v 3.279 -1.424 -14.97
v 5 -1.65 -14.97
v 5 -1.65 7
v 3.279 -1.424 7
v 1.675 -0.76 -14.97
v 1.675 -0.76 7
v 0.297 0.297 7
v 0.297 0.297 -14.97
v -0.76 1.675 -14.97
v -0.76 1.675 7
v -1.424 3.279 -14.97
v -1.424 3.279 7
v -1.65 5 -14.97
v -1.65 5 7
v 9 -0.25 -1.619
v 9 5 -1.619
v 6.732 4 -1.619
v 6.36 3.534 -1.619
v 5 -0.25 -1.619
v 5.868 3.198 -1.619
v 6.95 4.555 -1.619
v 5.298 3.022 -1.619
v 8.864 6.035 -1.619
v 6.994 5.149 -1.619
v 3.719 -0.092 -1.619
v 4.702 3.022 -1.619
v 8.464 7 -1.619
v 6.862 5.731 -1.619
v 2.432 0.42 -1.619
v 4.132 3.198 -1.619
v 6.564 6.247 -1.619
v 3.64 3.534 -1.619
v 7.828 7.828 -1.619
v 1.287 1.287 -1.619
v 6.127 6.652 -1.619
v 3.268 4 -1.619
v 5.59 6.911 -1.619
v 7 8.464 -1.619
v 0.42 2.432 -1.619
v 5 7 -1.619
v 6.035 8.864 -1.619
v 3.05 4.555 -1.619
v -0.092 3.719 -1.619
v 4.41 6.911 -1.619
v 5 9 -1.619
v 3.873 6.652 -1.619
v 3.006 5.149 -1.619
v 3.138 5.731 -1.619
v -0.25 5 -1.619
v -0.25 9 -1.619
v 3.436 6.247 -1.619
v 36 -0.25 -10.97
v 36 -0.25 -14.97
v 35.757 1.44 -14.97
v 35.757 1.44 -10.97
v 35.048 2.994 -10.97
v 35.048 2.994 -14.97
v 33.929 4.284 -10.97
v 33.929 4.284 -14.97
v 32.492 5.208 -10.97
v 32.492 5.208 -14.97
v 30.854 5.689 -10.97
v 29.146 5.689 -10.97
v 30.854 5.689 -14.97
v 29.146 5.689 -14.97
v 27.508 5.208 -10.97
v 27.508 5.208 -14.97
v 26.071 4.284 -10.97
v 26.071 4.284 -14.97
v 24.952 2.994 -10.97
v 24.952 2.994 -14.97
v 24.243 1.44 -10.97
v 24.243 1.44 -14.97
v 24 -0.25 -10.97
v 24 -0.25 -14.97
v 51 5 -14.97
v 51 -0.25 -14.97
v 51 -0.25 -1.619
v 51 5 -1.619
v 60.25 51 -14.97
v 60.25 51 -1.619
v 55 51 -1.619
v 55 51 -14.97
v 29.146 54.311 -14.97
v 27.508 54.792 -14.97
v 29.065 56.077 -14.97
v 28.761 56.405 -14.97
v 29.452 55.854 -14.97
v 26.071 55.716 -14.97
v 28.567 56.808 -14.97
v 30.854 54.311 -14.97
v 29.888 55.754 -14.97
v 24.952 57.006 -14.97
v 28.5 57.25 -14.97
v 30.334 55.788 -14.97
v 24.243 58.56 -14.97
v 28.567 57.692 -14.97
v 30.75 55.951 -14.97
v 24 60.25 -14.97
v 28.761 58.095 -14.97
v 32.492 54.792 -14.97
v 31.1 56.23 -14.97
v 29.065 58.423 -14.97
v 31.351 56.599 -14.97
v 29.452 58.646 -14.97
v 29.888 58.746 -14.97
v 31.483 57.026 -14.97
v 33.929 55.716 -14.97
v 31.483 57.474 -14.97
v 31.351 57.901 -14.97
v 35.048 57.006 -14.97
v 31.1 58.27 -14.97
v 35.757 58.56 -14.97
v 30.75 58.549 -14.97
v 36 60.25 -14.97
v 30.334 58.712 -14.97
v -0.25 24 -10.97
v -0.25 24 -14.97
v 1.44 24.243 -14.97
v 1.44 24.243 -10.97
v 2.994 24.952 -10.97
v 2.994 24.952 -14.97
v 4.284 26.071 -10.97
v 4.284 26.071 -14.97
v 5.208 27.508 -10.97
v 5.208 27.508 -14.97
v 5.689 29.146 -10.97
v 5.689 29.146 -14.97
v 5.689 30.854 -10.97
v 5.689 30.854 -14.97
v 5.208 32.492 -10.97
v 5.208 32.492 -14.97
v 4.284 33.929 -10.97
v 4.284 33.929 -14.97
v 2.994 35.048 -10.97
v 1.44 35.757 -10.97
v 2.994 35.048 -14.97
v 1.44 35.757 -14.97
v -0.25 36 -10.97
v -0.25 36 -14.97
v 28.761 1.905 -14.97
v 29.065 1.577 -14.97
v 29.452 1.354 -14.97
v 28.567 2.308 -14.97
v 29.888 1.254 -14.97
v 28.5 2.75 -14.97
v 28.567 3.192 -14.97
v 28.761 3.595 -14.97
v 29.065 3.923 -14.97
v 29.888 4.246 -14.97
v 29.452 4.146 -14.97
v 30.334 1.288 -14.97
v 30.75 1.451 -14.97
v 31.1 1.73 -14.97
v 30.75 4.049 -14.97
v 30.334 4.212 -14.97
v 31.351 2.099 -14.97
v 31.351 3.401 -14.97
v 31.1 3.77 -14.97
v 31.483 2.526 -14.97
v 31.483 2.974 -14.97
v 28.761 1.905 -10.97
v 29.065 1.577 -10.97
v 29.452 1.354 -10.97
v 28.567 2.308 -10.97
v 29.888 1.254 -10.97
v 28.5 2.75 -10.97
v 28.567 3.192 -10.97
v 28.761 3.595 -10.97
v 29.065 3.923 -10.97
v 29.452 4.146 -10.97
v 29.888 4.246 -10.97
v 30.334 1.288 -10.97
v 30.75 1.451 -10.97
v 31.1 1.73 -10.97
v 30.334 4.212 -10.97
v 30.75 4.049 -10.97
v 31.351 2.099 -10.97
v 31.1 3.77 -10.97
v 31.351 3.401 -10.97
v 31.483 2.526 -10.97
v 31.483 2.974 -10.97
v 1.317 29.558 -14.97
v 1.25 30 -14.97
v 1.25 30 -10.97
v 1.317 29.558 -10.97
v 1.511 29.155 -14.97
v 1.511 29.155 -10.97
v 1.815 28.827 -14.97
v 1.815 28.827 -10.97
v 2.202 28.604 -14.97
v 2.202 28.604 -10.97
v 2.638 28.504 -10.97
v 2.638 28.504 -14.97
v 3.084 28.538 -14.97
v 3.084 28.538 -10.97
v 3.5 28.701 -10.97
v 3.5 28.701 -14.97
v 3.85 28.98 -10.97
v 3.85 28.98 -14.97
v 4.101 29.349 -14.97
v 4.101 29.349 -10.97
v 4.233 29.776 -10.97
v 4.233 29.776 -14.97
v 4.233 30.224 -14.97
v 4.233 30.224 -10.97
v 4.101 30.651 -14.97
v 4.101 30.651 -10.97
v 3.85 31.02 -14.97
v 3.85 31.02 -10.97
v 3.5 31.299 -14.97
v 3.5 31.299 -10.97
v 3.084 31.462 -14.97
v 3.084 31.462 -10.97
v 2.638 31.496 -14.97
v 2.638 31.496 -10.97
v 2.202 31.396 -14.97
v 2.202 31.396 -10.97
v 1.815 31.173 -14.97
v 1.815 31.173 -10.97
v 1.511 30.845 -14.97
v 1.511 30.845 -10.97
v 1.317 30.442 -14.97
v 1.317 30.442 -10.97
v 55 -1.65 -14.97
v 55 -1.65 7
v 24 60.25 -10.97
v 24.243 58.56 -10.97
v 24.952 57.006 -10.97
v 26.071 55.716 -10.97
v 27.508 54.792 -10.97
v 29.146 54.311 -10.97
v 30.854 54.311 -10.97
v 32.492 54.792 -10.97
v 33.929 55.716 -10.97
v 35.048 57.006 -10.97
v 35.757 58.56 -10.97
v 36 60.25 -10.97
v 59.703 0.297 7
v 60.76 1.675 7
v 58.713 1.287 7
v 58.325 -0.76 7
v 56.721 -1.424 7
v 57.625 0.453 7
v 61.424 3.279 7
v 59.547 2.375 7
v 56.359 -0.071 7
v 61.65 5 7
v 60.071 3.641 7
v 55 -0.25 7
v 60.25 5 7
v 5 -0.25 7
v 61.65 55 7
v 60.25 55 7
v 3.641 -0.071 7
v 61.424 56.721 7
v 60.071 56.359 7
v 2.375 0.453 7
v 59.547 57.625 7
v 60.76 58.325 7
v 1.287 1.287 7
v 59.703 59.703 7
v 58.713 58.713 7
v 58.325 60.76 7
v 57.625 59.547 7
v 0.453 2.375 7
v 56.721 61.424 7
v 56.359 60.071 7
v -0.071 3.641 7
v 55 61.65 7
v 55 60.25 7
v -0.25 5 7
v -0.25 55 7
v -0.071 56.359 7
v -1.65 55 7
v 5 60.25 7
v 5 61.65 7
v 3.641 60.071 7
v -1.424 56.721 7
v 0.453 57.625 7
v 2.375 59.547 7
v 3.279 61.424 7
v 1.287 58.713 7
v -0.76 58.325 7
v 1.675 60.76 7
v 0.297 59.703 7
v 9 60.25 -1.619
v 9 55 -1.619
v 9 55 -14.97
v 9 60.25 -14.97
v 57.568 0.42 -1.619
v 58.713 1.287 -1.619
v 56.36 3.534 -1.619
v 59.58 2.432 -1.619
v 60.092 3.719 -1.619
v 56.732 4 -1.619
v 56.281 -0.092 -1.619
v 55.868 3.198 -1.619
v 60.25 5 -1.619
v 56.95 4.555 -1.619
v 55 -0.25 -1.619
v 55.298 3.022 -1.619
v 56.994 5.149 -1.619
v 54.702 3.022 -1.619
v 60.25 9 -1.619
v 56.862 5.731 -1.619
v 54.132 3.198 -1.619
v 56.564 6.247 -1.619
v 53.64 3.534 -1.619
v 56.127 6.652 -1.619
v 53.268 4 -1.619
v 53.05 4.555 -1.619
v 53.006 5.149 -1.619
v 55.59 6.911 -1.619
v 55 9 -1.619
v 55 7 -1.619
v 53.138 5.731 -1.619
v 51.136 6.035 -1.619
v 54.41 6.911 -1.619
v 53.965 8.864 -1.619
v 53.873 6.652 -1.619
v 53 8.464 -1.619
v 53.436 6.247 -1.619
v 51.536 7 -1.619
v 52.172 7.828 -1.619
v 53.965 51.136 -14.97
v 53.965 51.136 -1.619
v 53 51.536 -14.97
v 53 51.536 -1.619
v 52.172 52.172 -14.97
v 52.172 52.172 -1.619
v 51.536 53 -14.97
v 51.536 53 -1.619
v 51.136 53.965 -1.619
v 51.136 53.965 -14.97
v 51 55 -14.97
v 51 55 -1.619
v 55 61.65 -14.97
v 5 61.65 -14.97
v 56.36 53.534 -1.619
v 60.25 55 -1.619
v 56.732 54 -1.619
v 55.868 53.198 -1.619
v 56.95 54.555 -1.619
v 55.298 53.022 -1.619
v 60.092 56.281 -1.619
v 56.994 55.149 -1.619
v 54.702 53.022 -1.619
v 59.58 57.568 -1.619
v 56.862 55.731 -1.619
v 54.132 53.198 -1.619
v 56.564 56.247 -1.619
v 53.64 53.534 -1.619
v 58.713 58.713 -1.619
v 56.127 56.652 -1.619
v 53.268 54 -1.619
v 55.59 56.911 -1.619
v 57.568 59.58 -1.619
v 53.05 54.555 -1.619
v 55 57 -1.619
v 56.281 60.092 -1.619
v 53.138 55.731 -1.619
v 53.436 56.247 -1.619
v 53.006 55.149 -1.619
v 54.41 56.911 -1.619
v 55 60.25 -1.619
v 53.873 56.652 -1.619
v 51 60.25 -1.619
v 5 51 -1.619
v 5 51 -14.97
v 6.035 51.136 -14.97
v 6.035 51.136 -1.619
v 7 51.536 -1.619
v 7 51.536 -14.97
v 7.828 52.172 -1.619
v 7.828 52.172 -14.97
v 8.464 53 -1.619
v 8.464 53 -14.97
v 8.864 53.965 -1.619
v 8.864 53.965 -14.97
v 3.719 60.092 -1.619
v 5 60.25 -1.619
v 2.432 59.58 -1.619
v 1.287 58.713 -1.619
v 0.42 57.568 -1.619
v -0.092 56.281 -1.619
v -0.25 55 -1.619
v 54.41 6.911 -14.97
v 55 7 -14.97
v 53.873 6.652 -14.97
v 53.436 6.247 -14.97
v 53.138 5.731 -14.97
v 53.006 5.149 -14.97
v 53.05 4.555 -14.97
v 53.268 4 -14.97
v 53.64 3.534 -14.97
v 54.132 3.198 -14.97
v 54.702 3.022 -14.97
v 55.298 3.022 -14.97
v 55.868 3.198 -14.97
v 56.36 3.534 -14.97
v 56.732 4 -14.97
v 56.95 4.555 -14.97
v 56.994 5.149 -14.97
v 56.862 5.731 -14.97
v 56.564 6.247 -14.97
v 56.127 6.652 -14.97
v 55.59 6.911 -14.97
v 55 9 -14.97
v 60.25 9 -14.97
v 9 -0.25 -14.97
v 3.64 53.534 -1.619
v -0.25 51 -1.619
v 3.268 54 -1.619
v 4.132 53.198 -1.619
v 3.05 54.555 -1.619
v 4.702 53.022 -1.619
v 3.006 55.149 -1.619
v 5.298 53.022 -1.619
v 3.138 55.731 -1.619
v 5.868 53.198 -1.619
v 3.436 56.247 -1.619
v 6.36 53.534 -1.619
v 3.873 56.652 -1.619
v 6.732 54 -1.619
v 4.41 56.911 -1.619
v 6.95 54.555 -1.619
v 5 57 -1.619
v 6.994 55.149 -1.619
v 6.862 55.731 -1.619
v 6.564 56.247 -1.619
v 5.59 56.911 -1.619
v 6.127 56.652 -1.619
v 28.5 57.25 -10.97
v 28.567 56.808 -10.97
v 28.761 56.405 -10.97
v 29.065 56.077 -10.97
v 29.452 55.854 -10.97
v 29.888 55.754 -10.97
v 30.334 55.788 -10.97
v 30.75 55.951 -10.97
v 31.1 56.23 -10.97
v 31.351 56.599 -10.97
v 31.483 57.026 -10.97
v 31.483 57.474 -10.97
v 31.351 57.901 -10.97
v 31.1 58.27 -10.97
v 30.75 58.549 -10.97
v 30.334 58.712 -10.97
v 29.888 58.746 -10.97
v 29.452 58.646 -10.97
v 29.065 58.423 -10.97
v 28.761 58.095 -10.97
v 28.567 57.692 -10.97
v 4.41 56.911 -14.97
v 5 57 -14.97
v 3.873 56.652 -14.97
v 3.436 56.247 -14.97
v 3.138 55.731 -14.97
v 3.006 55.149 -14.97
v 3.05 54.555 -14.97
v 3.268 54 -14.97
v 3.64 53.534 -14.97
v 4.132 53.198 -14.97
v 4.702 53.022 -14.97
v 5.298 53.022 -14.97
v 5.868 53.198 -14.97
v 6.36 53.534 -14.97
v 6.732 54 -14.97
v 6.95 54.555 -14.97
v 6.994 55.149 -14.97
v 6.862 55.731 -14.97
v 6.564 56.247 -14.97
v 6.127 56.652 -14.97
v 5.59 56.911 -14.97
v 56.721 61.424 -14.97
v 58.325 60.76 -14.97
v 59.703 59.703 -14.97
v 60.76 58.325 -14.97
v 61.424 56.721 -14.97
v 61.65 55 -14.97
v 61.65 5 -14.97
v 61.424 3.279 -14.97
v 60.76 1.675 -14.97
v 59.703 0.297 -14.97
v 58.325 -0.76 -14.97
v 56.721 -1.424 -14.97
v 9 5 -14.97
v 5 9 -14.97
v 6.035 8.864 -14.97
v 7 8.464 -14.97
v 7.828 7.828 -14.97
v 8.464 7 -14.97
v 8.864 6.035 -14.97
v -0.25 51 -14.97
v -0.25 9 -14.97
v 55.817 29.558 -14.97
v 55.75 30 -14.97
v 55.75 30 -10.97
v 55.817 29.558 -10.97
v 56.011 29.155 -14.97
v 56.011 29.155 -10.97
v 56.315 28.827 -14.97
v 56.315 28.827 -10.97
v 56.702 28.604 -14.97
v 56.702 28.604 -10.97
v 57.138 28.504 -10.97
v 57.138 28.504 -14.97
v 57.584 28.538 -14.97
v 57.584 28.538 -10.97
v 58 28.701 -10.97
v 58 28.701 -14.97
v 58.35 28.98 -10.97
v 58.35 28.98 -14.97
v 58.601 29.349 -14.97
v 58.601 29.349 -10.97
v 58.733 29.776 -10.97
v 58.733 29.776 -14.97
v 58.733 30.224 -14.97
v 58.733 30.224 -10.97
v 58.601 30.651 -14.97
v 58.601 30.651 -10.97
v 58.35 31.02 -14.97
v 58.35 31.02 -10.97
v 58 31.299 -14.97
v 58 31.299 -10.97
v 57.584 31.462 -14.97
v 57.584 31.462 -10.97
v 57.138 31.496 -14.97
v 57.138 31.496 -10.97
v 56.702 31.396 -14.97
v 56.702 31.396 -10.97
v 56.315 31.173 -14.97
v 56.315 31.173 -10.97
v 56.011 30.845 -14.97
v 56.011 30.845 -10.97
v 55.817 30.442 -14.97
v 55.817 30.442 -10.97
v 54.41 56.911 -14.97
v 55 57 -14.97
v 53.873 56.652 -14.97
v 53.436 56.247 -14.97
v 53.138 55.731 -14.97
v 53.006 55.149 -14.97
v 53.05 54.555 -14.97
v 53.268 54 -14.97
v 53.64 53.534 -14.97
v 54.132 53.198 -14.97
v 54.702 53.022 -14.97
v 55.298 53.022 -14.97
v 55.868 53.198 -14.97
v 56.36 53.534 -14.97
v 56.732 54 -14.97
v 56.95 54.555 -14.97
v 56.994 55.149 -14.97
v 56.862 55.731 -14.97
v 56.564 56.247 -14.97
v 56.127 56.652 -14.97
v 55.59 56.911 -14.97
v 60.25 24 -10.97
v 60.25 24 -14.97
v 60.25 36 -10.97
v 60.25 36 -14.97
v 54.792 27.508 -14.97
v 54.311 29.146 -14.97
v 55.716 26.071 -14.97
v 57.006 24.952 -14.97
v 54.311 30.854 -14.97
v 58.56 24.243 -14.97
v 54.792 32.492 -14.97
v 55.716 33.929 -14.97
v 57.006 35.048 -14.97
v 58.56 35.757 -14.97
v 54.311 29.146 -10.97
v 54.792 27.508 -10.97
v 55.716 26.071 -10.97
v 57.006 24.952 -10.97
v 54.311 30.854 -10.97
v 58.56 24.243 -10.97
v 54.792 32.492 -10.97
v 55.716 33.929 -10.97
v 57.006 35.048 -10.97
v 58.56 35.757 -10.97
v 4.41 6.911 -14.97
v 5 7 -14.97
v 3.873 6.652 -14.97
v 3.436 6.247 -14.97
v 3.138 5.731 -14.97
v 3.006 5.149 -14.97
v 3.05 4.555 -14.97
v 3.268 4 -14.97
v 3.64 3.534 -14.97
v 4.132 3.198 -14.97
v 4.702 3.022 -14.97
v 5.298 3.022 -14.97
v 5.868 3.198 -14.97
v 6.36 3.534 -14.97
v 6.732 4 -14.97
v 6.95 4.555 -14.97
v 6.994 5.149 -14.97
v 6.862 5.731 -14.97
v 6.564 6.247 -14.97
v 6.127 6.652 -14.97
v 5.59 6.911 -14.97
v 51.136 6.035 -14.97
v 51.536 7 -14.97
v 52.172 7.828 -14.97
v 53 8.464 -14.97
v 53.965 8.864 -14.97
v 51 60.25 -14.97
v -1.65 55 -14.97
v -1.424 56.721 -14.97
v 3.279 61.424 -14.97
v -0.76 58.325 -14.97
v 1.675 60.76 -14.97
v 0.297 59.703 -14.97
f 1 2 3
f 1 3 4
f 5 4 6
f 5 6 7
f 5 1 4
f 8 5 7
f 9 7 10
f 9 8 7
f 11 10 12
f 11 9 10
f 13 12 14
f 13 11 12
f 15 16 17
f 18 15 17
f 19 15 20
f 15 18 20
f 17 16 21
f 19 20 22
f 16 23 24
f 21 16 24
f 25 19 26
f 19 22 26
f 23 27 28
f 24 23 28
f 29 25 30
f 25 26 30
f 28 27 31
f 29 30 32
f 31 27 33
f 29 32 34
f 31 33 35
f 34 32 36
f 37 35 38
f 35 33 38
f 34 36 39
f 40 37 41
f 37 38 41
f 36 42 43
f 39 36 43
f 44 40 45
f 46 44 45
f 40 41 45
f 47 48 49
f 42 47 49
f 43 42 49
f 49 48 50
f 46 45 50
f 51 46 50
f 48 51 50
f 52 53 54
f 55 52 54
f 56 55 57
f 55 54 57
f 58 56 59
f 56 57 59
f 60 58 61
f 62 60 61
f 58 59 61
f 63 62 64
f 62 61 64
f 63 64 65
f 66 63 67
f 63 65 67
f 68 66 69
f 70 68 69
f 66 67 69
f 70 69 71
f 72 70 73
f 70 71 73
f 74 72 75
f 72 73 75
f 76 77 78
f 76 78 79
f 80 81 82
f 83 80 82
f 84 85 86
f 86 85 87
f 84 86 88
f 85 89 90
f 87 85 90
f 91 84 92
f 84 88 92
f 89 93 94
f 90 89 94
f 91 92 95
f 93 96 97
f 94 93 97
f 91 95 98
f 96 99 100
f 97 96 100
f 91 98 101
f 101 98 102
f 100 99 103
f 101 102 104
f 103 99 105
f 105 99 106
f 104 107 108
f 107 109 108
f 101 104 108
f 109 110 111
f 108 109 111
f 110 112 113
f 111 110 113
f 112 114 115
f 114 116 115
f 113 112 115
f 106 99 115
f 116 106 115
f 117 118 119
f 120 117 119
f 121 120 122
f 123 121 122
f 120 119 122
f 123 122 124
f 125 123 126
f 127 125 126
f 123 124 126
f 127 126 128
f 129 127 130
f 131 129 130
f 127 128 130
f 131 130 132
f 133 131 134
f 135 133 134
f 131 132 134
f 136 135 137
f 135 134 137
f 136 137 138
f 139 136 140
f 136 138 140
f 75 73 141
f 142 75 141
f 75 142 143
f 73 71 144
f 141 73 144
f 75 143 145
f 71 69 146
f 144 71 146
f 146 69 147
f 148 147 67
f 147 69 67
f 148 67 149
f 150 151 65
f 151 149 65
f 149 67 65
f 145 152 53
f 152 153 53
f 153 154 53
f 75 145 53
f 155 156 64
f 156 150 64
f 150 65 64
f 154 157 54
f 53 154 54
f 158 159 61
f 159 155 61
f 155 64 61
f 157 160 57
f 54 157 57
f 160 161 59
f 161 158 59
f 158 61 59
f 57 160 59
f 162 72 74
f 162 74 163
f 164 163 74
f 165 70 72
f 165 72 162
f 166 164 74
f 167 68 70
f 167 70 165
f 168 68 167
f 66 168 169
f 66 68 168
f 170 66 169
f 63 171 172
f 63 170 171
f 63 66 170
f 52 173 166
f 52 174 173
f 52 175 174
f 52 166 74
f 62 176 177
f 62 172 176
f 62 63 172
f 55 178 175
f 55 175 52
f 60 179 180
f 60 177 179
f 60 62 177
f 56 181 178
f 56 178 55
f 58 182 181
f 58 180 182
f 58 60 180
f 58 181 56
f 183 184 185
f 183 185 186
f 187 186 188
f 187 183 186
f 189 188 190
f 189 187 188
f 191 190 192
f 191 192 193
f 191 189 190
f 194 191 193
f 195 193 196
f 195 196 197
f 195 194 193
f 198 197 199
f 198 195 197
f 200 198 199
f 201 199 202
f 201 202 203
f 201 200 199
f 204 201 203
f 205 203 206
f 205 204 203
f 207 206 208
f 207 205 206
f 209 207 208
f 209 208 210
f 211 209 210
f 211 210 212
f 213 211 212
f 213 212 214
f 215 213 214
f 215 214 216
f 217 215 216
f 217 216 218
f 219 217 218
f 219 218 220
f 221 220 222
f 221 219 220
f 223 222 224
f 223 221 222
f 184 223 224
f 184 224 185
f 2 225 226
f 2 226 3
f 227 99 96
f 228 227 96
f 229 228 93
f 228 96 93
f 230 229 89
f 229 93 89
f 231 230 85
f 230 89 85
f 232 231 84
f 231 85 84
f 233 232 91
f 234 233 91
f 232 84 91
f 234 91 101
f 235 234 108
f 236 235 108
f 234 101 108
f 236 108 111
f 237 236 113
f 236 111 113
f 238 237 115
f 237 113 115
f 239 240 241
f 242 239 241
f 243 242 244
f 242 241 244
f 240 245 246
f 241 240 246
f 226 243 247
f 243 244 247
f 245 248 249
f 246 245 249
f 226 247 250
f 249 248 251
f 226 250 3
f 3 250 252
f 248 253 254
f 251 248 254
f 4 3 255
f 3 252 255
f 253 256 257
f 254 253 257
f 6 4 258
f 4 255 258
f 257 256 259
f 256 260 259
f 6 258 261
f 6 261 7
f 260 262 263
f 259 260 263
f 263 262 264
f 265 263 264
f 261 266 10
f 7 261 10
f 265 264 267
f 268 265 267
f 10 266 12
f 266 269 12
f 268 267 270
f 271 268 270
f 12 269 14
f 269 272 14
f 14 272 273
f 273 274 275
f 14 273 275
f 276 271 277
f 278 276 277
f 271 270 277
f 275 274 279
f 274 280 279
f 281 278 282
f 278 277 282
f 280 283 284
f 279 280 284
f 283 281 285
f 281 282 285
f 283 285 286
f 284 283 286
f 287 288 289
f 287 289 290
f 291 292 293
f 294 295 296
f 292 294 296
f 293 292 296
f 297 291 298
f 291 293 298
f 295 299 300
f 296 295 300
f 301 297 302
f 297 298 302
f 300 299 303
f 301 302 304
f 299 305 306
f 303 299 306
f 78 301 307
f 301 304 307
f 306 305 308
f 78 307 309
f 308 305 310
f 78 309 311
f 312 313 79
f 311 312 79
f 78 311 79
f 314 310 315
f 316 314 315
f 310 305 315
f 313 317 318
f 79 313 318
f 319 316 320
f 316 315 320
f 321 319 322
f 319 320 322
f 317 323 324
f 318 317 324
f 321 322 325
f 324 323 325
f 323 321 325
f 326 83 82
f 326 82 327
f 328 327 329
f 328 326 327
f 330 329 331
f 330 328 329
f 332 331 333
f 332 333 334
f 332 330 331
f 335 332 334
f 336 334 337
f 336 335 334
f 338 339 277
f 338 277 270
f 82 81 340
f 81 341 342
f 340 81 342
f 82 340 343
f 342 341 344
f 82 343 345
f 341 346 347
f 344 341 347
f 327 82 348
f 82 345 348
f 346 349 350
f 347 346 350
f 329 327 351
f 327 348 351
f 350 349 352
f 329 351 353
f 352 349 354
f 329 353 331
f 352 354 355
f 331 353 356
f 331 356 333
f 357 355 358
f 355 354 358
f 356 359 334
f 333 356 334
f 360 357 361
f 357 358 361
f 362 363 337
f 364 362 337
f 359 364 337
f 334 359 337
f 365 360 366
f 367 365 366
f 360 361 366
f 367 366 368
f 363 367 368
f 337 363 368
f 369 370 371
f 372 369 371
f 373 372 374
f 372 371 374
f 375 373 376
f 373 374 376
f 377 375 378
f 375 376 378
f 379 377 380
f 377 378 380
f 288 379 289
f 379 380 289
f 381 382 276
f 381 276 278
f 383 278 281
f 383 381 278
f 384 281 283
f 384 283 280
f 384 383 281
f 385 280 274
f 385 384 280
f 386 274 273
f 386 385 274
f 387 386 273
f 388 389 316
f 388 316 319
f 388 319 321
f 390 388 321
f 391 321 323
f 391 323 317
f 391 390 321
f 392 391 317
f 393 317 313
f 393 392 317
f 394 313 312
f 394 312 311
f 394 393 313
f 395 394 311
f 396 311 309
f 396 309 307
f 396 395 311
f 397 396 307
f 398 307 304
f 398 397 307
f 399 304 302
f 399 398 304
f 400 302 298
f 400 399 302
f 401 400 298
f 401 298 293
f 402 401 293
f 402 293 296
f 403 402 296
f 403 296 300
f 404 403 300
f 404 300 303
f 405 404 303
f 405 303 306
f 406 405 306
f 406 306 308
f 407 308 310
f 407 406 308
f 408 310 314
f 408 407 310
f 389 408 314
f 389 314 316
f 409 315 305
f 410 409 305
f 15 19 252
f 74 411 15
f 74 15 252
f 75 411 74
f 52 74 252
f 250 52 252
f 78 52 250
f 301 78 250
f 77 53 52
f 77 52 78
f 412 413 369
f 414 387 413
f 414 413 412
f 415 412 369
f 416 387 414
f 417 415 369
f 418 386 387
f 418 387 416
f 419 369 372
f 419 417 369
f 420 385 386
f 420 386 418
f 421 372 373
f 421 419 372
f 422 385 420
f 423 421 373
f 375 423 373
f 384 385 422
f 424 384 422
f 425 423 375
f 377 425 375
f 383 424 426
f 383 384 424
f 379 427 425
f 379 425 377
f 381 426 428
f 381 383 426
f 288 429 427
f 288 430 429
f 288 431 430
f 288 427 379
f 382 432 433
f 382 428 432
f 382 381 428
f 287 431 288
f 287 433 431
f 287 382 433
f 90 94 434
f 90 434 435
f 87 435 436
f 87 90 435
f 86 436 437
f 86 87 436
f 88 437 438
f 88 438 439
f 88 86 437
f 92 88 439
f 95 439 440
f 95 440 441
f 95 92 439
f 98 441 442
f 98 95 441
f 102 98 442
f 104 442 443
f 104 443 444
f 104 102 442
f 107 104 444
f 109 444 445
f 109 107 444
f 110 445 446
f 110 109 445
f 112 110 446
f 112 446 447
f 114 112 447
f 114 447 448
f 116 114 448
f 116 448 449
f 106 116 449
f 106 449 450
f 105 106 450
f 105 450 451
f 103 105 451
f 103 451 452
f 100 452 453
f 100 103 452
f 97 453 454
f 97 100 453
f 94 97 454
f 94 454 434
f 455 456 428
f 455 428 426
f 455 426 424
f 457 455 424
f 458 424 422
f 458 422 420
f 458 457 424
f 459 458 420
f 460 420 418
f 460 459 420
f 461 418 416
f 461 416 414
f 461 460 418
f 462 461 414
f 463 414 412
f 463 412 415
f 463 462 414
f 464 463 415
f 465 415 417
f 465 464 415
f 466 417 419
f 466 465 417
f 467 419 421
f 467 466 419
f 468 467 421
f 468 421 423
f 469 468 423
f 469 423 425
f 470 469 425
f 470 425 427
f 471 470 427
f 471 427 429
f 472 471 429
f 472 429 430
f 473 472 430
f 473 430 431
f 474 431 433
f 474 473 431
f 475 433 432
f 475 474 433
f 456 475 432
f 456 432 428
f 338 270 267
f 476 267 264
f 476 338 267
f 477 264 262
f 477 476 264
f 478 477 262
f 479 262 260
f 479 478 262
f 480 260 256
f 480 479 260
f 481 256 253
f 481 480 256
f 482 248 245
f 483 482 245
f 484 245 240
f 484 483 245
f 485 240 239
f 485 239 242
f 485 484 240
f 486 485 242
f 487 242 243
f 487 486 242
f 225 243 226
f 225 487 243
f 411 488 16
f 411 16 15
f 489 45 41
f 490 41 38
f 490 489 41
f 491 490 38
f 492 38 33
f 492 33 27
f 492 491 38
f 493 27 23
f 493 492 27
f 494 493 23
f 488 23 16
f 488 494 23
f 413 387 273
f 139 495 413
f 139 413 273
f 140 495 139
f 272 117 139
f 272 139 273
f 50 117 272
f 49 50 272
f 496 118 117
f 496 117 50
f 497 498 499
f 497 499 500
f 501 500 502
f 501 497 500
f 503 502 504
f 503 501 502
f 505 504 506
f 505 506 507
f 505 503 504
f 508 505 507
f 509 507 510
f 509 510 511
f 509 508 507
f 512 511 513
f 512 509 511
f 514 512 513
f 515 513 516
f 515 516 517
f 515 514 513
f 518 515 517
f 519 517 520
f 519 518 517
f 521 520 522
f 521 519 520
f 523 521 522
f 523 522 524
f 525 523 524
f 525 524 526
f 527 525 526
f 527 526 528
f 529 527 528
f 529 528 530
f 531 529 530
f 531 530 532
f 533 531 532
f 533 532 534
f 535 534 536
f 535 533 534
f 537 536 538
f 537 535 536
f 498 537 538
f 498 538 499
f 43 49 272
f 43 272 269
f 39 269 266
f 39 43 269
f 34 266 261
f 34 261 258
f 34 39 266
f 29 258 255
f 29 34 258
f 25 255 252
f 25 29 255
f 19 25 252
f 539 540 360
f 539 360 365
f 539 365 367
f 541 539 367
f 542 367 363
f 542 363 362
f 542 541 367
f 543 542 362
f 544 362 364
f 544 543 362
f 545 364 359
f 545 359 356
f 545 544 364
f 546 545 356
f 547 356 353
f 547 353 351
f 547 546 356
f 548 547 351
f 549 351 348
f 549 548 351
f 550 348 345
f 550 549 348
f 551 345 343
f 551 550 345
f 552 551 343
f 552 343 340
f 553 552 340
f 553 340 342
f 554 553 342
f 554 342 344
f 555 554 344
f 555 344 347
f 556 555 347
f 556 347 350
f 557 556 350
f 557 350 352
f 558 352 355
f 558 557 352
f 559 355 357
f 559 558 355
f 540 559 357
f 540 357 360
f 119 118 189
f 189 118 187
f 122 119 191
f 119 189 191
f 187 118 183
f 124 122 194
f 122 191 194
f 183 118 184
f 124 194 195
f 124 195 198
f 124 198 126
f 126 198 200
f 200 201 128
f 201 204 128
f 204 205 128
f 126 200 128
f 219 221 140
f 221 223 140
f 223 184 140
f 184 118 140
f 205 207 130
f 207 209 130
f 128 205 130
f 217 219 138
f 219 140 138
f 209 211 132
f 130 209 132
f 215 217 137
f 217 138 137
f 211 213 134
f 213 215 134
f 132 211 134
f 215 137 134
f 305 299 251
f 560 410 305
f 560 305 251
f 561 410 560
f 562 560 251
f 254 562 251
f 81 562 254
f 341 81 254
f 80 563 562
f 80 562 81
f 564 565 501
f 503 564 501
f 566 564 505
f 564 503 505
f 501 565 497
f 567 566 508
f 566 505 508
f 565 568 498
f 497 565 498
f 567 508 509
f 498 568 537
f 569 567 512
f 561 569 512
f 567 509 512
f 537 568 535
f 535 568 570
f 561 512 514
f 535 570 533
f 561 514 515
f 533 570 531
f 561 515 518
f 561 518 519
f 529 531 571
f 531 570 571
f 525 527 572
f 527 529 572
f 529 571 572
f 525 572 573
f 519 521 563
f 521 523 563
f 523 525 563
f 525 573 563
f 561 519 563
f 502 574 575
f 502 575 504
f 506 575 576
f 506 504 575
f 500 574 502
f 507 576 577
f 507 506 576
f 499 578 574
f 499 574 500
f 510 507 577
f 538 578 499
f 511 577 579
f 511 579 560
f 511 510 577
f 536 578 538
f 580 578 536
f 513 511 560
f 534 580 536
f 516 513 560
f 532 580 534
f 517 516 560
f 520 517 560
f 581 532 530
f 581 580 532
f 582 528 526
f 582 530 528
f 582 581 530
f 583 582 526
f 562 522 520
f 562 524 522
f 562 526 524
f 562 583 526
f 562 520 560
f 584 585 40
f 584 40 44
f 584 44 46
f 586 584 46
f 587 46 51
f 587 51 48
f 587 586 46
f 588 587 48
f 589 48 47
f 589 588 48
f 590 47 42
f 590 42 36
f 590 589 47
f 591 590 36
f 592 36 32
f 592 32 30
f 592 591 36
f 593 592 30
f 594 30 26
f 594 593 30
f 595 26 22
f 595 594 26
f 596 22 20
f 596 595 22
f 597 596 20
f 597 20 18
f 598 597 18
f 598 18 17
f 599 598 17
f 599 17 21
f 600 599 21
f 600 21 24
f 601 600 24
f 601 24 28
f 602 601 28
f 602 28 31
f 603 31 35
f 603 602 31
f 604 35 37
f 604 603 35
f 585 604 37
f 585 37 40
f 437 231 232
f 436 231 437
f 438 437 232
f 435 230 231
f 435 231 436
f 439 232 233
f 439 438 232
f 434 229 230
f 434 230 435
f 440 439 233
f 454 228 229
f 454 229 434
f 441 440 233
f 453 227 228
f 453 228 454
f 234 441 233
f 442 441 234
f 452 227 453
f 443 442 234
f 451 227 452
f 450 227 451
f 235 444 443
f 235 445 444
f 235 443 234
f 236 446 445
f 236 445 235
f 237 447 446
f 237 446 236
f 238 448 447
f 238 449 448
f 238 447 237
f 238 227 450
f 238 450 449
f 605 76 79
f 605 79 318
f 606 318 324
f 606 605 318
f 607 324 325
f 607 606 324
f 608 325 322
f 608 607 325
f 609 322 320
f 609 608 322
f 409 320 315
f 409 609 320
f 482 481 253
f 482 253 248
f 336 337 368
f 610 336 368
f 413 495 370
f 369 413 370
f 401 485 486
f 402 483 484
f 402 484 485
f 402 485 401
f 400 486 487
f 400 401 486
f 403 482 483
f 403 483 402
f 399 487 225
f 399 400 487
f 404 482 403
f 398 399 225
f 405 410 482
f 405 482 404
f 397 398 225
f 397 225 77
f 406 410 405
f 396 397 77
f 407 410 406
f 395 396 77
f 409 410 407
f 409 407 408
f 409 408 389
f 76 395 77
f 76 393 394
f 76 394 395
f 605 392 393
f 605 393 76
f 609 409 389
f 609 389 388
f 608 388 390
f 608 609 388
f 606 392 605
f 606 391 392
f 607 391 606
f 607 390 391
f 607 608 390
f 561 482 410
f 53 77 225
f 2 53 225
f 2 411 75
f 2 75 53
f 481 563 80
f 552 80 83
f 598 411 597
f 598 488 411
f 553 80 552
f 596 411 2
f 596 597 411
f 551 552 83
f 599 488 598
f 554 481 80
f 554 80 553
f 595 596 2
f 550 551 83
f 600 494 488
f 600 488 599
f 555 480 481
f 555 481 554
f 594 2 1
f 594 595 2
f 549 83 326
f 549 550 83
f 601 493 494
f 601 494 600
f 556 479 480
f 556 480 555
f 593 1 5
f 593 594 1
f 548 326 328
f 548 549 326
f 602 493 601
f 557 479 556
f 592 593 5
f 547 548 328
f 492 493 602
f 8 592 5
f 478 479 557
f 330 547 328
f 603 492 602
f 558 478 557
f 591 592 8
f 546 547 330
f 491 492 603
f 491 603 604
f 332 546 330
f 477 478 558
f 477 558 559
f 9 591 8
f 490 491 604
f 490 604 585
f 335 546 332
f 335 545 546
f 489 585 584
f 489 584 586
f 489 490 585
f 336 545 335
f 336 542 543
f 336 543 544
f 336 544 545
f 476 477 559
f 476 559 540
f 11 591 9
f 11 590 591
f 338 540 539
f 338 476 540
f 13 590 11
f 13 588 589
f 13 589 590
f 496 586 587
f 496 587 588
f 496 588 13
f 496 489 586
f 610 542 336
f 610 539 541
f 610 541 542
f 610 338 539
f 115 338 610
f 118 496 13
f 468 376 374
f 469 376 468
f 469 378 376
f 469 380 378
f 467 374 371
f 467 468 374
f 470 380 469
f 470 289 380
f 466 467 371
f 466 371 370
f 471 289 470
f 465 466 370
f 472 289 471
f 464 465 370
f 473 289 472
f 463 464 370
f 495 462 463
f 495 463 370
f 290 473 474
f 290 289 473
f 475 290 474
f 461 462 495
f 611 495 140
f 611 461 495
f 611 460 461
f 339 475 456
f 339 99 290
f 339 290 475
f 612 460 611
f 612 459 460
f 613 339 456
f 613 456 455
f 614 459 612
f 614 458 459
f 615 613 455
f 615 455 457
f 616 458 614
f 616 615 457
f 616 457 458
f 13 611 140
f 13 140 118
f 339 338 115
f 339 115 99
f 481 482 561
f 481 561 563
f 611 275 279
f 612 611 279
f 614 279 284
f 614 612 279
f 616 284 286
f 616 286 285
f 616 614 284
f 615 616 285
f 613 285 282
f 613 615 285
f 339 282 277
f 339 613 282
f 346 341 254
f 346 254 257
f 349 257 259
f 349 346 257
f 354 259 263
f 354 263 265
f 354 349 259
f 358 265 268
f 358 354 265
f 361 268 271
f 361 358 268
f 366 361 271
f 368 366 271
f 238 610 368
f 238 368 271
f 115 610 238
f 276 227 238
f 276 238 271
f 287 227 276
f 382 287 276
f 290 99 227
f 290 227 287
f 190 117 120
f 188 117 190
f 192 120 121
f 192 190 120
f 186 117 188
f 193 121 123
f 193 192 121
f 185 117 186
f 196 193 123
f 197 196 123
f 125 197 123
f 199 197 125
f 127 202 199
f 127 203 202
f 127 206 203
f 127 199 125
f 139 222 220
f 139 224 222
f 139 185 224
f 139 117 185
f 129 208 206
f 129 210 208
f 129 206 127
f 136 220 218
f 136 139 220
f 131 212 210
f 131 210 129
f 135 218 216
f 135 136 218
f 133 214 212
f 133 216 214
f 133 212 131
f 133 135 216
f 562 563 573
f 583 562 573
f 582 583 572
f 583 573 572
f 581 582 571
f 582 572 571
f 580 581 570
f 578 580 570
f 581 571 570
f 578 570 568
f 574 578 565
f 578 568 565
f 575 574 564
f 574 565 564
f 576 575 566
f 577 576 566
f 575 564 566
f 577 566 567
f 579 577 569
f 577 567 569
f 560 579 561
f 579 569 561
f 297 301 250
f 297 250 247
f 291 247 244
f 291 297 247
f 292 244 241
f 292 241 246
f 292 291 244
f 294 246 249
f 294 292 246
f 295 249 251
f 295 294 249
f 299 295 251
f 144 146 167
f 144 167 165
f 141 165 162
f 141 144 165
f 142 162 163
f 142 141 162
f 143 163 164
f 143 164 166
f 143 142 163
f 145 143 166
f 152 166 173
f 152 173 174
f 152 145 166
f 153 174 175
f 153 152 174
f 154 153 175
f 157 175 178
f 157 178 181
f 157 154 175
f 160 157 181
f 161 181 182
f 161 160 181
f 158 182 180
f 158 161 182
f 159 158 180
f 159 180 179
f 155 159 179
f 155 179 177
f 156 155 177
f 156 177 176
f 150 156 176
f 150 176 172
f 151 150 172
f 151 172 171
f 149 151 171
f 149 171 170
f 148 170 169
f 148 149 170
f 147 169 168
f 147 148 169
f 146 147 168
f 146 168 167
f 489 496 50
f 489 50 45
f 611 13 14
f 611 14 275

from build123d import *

# Parameters (mm, degrees)
BOSS_EXTRUDE1_DEPTH      = 7
BOSS_EXTRUDE1_DEPTH_BACK = 14.970201
BOSS_EXTRUDE2_START      = -14.970201
SKETCH2_R                = 2
BOSS_EXTRUDE2_DEPTH      = 13.350798149
BOSS_EXTRUDE3_START      = -14.970203
SKETCH3_R                = 1.5
BOSS_EXTRUDE3_DEPTH      = 4.000003


with BuildPart() as part:
    # Sketch1 → Boss-Extrude1 (new, two sides: drawn at the far end of the back side and taken through both)
    with BuildSketch(Plane.XY.offset(-BOSS_EXTRUDE1_DEPTH_BACK)):
        with BuildLine():
            Line((54.999742941, -1.649999966), (5.000257256, -1.649999966))
            ThreePointArc((5.000257256, -1.649999966), (0.297273819, 0.297273819), (-1.649999966, 5.000257256))
            Line((-1.649999966, 5.000257256), (-1.649999966, 54.999742941))
            ThreePointArc((-1.649999966, 54.999742941), (0.297274177, 59.702725823), (5.000257059, 61.649999966))
            Line((5.000257059, 61.649999966), (54.999743139, 61.649999966))
            ThreePointArc((54.999743139, 61.649999966), (59.702725466, 59.702725466), (61.649999966, 54.999743139))
            Line((61.649999966, 54.999743139), (61.649999966, 5.000257059))
            ThreePointArc((61.649999966, 5.000257059), (59.702725823, 0.297274177), (54.999742941, -1.649999966))
        make_face()
        with BuildLine():
            ThreePointArc((5.000039752, 60.249999994), (1.287223653, 58.712776347), (-0.249999994, 54.999960248))
            Line((-0.249999994, 54.999960248), (-0.249999994, 5.000039782))
            ThreePointArc((-0.249999994, 5.000039782), (1.287223296, 1.287223296), (5.000039782, -0.249999994))
            Line((5.000039782, -0.249999994), (54.999960248, -0.249999994))
            ThreePointArc((54.999960248, -0.249999994), (58.712776347, 1.287223653), (60.249999994, 5.000039752))
            Line((60.249999994, 5.000039752), (60.249999994, 54.999960279))
            ThreePointArc((60.249999994, 54.999960279), (58.712775989, 58.712775989), (54.999960279, 60.249999994))
            Line((54.999960279, 60.249999994), (5.000039752, 60.249999994))
        make_face(mode=Mode.SUBTRACT)
    extrude(amount=BOSS_EXTRUDE1_DEPTH + BOSS_EXTRUDE1_DEPTH_BACK)


with BuildPart() as boss_extrude2_tool:
    # Sketch2 → Boss-Extrude2 (new body)
    # profile 1 of 4: a face of its own
    with BuildSketch(Plane.XY.offset(BOSS_EXTRUDE2_START)):
        with BuildLine():
            Line((9.00000016, 54.99999922), (9.00000016, 60.249999994))
            Line((9.00000016, 60.249999994), (5.000039752, 60.249999994))
            add(Edge.make_bspline(
                [(-0.249999994, 54.999960248), (-0.250954892, 58.075921633), (1.924078367, 60.250954892), (5.000039752, 60.249999994)],
                knots=[0, 0, 0, 0, 1, 1, 1, 1], degree=3, weights=[1, 0.804591489, 0.804591489, 1]))
            Line((-0.249999994, 54.999960248), (-0.249999994, 50.99999922))
            Line((-0.249999994, 50.99999922), (5.00000016, 50.99999922))
            ThreePointArc((5.00000016, 50.99999922), (7.828427285, 52.171572095), (9.00000016, 54.99999922))
        make_face()
        with Locations(Location((5.00000016, 54.99999922, 0), (0, 0, 90))):
            Circle(SKETCH2_R, mode=Mode.SUBTRACT)
    # profile 2 of 4: a face of its own
    with BuildSketch(Plane.XY.offset(BOSS_EXTRUDE2_START)):
        with BuildLine():
            Line((50.99999922, 54.99999984), (50.99999922, 60.249999994))
            Line((50.99999922, 60.249999994), (54.999960248, 60.249999994))
            add(Edge.make_bspline(
                [(54.999960248, 60.249999994), (58.075921633, 60.250954892), (60.250954892, 58.075921633), (60.249999994, 54.999960248)],
                knots=[0, 0, 0, 0, 1, 1, 1, 1], degree=3, weights=[1, 0.804591489, 0.804591489, 1]))
            Line((60.249999994, 54.999960248), (60.249999994, 50.99999984))
            Line((60.249999994, 50.99999984), (54.99999922, 50.99999984))
            ThreePointArc((54.99999922, 50.99999984), (52.171572095, 52.171572715), (50.99999922, 54.99999984))
        make_face()
        with Locations(Location((54.99999922, 54.99999984, 0), (0, 0, 90))):
            Circle(SKETCH2_R, mode=Mode.SUBTRACT)
    # profile 3 of 4: a face of its own
    with BuildSketch(Plane.XY.offset(BOSS_EXTRUDE2_START)):
        with BuildLine():
            Line((54.99999984, 9.00000078), (60.249999994, 9.00000078))
            Line((60.249999994, 9.00000078), (60.249999994, 5.000039752))
            add(Edge.make_bspline(
                [(60.249999994, 5.000039752), (60.250954892, 1.924078367), (58.075921633, -0.250954892), (54.999960248, -0.249999994)],
                knots=[0, 0, 0, 0, 1, 1, 1, 1], degree=3, weights=[1, 0.804591489, 0.804591489, 1]))
            Line((54.999960248, -0.249999994), (50.99999984, -0.249999994))
            Line((50.99999984, -0.249999994), (50.99999984, 5.00000078))
            ThreePointArc((50.99999984, 5.00000078), (52.171572715, 7.828427905), (54.99999984, 9.00000078))
        make_face()
        with Locations(Location((54.99999984, 5.00000078, 0), (0, 0, 90))):
            Circle(SKETCH2_R, mode=Mode.SUBTRACT)
    # profile 4 of 4: a face of its own
    with BuildSketch(Plane.XY.offset(BOSS_EXTRUDE2_START)):
        with BuildLine():
            Line((9.00000078, 5.00000016), (9.00000078, -0.249999994))
            Line((9.00000078, -0.249999994), (5.000039752, -0.249999994))
            add(Edge.make_bspline(
                [(5.000039752, -0.249999994), (1.924078367, -0.250954892), (-0.250954892, 1.924078367), (-0.249999994, 5.000039752)],
                knots=[0, 0, 0, 0, 1, 1, 1, 1], degree=3, weights=[1, 0.804591489, 0.804591489, 1]))
            Line((-0.249999994, 5.000039752), (-0.249999994, 9.00000016))
            Line((-0.249999994, 9.00000016), (5.00000078, 9.00000016))
            ThreePointArc((5.00000078, 9.00000016), (7.828427905, 7.828427285), (9.00000078, 5.00000016))
        make_face()
        with Locations(Location((5.00000078, 5.00000016, 0), (0, 0, 90))):
            Circle(SKETCH2_R, mode=Mode.SUBTRACT)
    extrude(amount=BOSS_EXTRUDE2_DEPTH)


with BuildPart() as part_1:
    add(part.part)


with BuildPart() as part_2:
    # Boss-Extrude2: joined with boss_extrude2_tool
    add(part_1.part.fuse(boss_extrude2_tool.part, tol=0.00001))

    # Sketch3 → Boss-Extrude3 (add)
    # profile 1 of 4: a face of its own
    with BuildSketch(Plane.XY.offset(BOSS_EXTRUDE3_START)):
        with BuildLine():
            Line((60.249999994, 23.999999985), (60.249999994, 35.999999985))
            ThreePointArc((60.249999994, 35.999999985), (54.249999994, 29.999999985), (60.249999994, 23.999999985))
        make_face()
        with Locations(Location((57.249999994, 29.999999985, 0), (0, 0, 180))):
            Circle(SKETCH3_R, mode=Mode.SUBTRACT)
    # profile 2 of 4: a face of its own
    with BuildSketch(Plane.XY.offset(BOSS_EXTRUDE3_START)):
        with BuildLine():
            Line((36.000000015, 60.249999994), (24.000000015, 60.249999994))
            ThreePointArc((24.000000015, 60.249999994), (30.000000015, 54.249999994), (36.000000015, 60.249999994))
        make_face()
        with Locations(Location((30.000000015, 57.249999994, 0), (0, 0, 180))):
            Circle(SKETCH3_R, mode=Mode.SUBTRACT)
    # profile 3 of 4: a face of its own
    with BuildSketch(Plane.XY.offset(BOSS_EXTRUDE3_START)):
        with BuildLine():
            Line((23.999999985, -0.249999994), (35.999999985, -0.249999994))
            ThreePointArc((35.999999985, -0.249999994), (29.999999985, 5.750000006), (23.999999985, -0.249999994))
        make_face()
        with Locations(Location((29.999999985, 2.750000006, 0), (0, 0, 180))):
            Circle(SKETCH3_R, mode=Mode.SUBTRACT)
    # profile 4 of 4: a face of its own
    with BuildSketch(Plane.XY.offset(BOSS_EXTRUDE3_START)):
        with BuildLine():
            Line((-0.249999994, 36.000000015), (-0.249999994, 24.000000015))
            ThreePointArc((-0.249999994, 24.000000015), (5.750000006, 30.000000015), (-0.249999994, 36.000000015))
        make_face()
        with Locations(Location((2.750000006, 30.000000015, 0), (0, 0, 180))):
            Circle(SKETCH3_R, mode=Mode.SUBTRACT)
    extrude(amount=BOSS_EXTRUDE3_DEPTH)


solid = part_2.part
